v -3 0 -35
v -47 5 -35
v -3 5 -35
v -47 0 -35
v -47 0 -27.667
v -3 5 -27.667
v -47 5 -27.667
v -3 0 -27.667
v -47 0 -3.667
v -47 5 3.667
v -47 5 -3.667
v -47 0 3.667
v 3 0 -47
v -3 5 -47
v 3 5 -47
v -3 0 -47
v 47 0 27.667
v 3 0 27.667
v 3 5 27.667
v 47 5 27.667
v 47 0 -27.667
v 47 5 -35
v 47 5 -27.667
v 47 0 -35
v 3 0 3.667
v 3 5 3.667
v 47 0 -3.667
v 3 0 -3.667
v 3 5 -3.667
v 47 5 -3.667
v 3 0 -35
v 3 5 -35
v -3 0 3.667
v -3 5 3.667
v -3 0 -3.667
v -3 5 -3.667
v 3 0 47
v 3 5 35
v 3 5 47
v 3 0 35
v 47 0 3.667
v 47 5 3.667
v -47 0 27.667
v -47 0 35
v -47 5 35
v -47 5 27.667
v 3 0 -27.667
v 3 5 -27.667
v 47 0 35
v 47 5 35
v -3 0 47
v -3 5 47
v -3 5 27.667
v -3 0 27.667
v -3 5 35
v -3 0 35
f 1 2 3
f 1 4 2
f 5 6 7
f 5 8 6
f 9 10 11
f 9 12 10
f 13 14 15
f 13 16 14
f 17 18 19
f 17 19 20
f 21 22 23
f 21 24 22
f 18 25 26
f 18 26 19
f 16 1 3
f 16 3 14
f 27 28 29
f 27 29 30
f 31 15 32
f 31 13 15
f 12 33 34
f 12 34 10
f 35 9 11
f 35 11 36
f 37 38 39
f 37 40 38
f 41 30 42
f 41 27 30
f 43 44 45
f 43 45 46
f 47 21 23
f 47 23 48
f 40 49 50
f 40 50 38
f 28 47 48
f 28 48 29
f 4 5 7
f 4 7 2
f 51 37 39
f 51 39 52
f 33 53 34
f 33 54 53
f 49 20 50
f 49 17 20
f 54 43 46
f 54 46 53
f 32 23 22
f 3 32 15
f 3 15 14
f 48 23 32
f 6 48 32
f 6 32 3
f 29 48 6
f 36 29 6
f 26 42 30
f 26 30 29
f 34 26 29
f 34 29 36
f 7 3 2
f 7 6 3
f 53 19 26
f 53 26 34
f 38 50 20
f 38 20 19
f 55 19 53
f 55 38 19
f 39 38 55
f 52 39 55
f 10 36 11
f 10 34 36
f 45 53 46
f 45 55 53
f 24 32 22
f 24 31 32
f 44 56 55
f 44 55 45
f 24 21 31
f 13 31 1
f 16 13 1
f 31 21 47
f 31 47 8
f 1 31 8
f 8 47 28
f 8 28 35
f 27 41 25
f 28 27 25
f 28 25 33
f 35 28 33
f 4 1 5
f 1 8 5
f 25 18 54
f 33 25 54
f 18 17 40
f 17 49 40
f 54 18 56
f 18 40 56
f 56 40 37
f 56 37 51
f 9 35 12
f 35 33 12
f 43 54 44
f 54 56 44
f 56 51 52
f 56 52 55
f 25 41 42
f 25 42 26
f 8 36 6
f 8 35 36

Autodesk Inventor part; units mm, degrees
ref_plane "YZ Plane" through (0, 0, 0) normal (1, 0, 0) x (0, 1, 0)
ref_plane "XZ Plane" through (0, 0, 0) normal (0, 1, 0) x (-1, 0, 0)
ref_plane "XY Plane" through (0, 0, 0) normal (0, 0, 1) x (1, 0, 0)
sketch "Sketch1" plane through (0, 0, 0) normal (0, 1, 0) x (-1, 0, 0)
  line L0 (-47, 47) -> (47, 47)
  line L1 (47, 47) -> (47, -47)
  line L2 (47, -47) -> (-47, -47)
  line L3 (-47, -47) -> (-47, 47)
  line L4 (-47, 47) -> (47, -47) construction
  line L5 (47, 47) -> (-47, -47) construction
  line L6 (47, -35) -> (3, -35)
  line L7 (3, -35) -> (3, -47)
  line L8 (3, -47) -> (47, -47)
  line L9 (47, -47) -> (47, -35)
  line L10 (47, -3.667) -> (3, -3.667)
  line L11 (3, -3.667) -> (3, -27.667)
  line L12 (3, -27.667) -> (47, -27.667)
  line L13 (47, -27.667) -> (47, -3.667)
  point P0 (0, 0)
  point P1 (25, -47)
  point P2 (25, -35)
  dimension "d0" = 94
  dimension "d1" = 94
  dimension "d2" = 12
  dimension "d3" = 24
  dimension "d4" = 7.333
  dimension "d9" = 3
  dimension "d10" = 0
extrude "Extrusion1" add sketch "Sketch1" along normal blind 5
extrude "Extrusion2" cut sketch "Sketch1" along normal blind 5 contours L1 L12 L11 L10 | L7 L6 L1 L2
mirror "Mirror1" about plane through (0, 0, 0) normal (1, 0, 0) of "Extrusion2"
mirror "Mirror2" about plane through (0, 0, 0) normal (0, 0, 1) of "Extrusion2", "Mirror1"
properties part number "Grid RS3" material "Steel"
